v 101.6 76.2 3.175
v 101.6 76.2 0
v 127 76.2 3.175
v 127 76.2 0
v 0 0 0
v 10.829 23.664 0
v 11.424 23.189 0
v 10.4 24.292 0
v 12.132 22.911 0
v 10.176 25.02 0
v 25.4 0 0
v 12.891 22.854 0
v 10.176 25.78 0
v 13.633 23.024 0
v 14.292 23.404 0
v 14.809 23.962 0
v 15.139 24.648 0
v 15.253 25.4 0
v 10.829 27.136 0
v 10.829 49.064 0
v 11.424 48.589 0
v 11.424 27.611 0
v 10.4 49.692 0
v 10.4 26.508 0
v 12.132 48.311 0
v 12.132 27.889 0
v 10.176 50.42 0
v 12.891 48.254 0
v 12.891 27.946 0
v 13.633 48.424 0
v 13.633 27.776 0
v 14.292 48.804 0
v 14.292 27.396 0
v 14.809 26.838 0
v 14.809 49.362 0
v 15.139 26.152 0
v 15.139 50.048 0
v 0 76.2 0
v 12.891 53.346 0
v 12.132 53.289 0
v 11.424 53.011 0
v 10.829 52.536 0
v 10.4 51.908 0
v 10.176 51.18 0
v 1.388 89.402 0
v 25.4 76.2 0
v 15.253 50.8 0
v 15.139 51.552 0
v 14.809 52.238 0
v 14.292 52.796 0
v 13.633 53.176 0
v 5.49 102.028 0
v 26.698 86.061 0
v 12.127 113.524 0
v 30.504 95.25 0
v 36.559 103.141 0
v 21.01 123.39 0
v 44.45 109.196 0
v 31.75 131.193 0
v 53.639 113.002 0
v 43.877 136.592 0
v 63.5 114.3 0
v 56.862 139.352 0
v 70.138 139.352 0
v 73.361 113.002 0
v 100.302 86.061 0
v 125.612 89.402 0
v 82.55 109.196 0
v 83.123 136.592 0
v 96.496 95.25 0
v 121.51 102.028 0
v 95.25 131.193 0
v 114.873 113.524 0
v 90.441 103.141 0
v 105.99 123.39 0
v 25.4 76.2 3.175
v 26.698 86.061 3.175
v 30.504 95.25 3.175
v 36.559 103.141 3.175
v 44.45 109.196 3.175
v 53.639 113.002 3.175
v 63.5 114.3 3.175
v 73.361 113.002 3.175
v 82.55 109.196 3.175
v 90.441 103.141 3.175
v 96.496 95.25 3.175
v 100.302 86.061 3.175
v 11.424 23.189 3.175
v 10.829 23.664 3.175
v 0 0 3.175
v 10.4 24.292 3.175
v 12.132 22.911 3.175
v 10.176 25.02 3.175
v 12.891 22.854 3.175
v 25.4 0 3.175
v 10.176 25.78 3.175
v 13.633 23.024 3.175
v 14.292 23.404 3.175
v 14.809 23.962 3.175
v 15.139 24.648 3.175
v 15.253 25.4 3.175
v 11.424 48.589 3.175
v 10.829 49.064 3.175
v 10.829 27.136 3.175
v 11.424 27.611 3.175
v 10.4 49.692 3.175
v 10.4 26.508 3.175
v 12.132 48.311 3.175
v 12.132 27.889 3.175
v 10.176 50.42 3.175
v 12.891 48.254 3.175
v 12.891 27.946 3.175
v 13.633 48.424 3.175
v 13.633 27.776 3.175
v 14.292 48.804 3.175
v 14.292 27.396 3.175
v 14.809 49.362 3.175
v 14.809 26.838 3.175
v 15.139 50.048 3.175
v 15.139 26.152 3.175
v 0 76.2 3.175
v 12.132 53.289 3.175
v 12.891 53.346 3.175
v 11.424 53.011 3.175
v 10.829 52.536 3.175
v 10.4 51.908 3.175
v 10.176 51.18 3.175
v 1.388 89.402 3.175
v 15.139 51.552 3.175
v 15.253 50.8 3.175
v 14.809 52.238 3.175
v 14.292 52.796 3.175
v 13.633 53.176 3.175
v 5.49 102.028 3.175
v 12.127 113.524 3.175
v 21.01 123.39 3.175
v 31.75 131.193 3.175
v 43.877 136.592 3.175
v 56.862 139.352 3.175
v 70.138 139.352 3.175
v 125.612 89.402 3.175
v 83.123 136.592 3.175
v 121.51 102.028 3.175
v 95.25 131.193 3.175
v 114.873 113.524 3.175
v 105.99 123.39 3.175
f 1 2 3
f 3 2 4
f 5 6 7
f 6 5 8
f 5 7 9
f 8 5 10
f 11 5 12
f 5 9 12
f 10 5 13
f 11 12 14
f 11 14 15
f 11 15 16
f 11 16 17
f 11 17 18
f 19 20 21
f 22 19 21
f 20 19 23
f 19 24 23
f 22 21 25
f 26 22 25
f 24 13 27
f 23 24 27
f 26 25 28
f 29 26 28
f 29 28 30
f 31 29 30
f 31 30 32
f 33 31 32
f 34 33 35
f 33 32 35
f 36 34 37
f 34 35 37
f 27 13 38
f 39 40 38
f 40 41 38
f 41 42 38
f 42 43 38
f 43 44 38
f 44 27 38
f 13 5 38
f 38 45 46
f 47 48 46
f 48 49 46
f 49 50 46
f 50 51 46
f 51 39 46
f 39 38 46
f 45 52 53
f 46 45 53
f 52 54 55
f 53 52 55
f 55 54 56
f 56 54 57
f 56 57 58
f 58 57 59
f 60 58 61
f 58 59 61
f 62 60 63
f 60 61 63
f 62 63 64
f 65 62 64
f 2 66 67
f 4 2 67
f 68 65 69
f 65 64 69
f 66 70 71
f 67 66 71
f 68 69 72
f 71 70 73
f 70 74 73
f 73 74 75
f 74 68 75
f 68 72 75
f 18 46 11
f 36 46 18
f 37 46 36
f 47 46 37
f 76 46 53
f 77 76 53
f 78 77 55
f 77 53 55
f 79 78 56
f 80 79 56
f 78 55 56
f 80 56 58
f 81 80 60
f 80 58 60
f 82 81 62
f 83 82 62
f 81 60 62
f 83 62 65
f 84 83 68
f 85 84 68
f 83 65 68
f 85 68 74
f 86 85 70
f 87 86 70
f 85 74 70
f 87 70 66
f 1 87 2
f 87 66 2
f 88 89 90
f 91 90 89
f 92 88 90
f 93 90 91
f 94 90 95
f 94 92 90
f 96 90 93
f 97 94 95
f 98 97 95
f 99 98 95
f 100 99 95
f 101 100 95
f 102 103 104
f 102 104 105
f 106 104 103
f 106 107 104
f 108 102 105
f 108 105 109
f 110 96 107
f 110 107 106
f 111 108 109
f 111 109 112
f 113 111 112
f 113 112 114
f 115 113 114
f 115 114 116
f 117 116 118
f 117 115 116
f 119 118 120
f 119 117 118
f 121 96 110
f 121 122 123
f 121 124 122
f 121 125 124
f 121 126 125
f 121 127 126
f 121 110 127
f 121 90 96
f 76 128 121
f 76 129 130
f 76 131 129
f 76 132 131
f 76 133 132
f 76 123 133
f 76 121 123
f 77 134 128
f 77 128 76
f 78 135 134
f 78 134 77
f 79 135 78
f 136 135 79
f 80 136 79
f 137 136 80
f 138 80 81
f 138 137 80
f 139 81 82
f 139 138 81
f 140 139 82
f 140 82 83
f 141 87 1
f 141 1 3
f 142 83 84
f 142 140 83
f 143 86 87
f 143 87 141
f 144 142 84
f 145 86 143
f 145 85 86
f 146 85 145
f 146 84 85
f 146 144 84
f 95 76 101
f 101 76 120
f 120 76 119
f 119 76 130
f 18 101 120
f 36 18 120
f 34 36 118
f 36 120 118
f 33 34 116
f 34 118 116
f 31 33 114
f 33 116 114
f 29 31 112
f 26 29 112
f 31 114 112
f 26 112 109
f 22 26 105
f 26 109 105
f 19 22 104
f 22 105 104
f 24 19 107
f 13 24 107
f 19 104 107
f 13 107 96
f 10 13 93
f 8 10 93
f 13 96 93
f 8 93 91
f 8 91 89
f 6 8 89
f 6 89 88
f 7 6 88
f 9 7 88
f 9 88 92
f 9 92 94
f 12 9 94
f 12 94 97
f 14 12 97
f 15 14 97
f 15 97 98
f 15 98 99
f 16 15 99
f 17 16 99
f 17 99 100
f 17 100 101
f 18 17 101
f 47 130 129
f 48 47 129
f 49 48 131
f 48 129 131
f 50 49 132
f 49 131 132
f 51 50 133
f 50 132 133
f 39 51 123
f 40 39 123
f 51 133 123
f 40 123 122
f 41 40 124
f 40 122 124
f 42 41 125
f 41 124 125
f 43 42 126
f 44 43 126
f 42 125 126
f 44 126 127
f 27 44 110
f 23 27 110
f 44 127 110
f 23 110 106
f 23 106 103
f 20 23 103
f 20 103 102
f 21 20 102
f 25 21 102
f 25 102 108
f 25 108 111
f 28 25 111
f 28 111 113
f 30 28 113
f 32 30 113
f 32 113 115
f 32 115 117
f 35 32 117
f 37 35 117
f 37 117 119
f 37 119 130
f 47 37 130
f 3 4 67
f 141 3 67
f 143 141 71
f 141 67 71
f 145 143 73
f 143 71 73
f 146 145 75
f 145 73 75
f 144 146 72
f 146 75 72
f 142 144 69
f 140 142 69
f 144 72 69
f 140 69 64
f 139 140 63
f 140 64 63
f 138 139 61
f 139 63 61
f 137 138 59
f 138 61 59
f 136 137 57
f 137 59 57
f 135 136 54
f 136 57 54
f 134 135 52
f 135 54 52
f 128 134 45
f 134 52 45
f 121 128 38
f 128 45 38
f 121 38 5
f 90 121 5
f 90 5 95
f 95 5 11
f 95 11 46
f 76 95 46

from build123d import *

# Parameters (mm, degrees)
BOSS_EXTRUDE1_DEPTH    = 3.175
F_10_CLEARANCE_HOLE1_D = 5.1054


with BuildPart() as part:
    # Sketch1 → Boss-Extrude1 (new body)
    with BuildSketch(Plane.XY):
        with BuildLine():
            Line((0, 0), (25.4, 0))
            Line((25.4, 0), (25.4, 76.2))
            ThreePointArc((25.4, 76.2), (63.5, 114.3), (101.6, 76.2))
            Line((101.6, 76.2), (127, 76.2))
            ThreePointArc((127, 76.2), (63.5, 139.7), (0, 76.2))
            Line((0, 76.2), (0, 0))
        make_face()
    extrude(amount=BOSS_EXTRUDE1_DEPTH)

    # #10 Clearance Hole1 (through all)
    with Locations(Plane(origin=(0, 0, 0), x_dir=(-1, 0, 0), z_dir=(0, 0, -1))):
        with Locations((-12.7, 25.4), (-12.7, 50.8)):
            Hole(F_10_CLEARANCE_HOLE1_D / 2)


solid = part.part
